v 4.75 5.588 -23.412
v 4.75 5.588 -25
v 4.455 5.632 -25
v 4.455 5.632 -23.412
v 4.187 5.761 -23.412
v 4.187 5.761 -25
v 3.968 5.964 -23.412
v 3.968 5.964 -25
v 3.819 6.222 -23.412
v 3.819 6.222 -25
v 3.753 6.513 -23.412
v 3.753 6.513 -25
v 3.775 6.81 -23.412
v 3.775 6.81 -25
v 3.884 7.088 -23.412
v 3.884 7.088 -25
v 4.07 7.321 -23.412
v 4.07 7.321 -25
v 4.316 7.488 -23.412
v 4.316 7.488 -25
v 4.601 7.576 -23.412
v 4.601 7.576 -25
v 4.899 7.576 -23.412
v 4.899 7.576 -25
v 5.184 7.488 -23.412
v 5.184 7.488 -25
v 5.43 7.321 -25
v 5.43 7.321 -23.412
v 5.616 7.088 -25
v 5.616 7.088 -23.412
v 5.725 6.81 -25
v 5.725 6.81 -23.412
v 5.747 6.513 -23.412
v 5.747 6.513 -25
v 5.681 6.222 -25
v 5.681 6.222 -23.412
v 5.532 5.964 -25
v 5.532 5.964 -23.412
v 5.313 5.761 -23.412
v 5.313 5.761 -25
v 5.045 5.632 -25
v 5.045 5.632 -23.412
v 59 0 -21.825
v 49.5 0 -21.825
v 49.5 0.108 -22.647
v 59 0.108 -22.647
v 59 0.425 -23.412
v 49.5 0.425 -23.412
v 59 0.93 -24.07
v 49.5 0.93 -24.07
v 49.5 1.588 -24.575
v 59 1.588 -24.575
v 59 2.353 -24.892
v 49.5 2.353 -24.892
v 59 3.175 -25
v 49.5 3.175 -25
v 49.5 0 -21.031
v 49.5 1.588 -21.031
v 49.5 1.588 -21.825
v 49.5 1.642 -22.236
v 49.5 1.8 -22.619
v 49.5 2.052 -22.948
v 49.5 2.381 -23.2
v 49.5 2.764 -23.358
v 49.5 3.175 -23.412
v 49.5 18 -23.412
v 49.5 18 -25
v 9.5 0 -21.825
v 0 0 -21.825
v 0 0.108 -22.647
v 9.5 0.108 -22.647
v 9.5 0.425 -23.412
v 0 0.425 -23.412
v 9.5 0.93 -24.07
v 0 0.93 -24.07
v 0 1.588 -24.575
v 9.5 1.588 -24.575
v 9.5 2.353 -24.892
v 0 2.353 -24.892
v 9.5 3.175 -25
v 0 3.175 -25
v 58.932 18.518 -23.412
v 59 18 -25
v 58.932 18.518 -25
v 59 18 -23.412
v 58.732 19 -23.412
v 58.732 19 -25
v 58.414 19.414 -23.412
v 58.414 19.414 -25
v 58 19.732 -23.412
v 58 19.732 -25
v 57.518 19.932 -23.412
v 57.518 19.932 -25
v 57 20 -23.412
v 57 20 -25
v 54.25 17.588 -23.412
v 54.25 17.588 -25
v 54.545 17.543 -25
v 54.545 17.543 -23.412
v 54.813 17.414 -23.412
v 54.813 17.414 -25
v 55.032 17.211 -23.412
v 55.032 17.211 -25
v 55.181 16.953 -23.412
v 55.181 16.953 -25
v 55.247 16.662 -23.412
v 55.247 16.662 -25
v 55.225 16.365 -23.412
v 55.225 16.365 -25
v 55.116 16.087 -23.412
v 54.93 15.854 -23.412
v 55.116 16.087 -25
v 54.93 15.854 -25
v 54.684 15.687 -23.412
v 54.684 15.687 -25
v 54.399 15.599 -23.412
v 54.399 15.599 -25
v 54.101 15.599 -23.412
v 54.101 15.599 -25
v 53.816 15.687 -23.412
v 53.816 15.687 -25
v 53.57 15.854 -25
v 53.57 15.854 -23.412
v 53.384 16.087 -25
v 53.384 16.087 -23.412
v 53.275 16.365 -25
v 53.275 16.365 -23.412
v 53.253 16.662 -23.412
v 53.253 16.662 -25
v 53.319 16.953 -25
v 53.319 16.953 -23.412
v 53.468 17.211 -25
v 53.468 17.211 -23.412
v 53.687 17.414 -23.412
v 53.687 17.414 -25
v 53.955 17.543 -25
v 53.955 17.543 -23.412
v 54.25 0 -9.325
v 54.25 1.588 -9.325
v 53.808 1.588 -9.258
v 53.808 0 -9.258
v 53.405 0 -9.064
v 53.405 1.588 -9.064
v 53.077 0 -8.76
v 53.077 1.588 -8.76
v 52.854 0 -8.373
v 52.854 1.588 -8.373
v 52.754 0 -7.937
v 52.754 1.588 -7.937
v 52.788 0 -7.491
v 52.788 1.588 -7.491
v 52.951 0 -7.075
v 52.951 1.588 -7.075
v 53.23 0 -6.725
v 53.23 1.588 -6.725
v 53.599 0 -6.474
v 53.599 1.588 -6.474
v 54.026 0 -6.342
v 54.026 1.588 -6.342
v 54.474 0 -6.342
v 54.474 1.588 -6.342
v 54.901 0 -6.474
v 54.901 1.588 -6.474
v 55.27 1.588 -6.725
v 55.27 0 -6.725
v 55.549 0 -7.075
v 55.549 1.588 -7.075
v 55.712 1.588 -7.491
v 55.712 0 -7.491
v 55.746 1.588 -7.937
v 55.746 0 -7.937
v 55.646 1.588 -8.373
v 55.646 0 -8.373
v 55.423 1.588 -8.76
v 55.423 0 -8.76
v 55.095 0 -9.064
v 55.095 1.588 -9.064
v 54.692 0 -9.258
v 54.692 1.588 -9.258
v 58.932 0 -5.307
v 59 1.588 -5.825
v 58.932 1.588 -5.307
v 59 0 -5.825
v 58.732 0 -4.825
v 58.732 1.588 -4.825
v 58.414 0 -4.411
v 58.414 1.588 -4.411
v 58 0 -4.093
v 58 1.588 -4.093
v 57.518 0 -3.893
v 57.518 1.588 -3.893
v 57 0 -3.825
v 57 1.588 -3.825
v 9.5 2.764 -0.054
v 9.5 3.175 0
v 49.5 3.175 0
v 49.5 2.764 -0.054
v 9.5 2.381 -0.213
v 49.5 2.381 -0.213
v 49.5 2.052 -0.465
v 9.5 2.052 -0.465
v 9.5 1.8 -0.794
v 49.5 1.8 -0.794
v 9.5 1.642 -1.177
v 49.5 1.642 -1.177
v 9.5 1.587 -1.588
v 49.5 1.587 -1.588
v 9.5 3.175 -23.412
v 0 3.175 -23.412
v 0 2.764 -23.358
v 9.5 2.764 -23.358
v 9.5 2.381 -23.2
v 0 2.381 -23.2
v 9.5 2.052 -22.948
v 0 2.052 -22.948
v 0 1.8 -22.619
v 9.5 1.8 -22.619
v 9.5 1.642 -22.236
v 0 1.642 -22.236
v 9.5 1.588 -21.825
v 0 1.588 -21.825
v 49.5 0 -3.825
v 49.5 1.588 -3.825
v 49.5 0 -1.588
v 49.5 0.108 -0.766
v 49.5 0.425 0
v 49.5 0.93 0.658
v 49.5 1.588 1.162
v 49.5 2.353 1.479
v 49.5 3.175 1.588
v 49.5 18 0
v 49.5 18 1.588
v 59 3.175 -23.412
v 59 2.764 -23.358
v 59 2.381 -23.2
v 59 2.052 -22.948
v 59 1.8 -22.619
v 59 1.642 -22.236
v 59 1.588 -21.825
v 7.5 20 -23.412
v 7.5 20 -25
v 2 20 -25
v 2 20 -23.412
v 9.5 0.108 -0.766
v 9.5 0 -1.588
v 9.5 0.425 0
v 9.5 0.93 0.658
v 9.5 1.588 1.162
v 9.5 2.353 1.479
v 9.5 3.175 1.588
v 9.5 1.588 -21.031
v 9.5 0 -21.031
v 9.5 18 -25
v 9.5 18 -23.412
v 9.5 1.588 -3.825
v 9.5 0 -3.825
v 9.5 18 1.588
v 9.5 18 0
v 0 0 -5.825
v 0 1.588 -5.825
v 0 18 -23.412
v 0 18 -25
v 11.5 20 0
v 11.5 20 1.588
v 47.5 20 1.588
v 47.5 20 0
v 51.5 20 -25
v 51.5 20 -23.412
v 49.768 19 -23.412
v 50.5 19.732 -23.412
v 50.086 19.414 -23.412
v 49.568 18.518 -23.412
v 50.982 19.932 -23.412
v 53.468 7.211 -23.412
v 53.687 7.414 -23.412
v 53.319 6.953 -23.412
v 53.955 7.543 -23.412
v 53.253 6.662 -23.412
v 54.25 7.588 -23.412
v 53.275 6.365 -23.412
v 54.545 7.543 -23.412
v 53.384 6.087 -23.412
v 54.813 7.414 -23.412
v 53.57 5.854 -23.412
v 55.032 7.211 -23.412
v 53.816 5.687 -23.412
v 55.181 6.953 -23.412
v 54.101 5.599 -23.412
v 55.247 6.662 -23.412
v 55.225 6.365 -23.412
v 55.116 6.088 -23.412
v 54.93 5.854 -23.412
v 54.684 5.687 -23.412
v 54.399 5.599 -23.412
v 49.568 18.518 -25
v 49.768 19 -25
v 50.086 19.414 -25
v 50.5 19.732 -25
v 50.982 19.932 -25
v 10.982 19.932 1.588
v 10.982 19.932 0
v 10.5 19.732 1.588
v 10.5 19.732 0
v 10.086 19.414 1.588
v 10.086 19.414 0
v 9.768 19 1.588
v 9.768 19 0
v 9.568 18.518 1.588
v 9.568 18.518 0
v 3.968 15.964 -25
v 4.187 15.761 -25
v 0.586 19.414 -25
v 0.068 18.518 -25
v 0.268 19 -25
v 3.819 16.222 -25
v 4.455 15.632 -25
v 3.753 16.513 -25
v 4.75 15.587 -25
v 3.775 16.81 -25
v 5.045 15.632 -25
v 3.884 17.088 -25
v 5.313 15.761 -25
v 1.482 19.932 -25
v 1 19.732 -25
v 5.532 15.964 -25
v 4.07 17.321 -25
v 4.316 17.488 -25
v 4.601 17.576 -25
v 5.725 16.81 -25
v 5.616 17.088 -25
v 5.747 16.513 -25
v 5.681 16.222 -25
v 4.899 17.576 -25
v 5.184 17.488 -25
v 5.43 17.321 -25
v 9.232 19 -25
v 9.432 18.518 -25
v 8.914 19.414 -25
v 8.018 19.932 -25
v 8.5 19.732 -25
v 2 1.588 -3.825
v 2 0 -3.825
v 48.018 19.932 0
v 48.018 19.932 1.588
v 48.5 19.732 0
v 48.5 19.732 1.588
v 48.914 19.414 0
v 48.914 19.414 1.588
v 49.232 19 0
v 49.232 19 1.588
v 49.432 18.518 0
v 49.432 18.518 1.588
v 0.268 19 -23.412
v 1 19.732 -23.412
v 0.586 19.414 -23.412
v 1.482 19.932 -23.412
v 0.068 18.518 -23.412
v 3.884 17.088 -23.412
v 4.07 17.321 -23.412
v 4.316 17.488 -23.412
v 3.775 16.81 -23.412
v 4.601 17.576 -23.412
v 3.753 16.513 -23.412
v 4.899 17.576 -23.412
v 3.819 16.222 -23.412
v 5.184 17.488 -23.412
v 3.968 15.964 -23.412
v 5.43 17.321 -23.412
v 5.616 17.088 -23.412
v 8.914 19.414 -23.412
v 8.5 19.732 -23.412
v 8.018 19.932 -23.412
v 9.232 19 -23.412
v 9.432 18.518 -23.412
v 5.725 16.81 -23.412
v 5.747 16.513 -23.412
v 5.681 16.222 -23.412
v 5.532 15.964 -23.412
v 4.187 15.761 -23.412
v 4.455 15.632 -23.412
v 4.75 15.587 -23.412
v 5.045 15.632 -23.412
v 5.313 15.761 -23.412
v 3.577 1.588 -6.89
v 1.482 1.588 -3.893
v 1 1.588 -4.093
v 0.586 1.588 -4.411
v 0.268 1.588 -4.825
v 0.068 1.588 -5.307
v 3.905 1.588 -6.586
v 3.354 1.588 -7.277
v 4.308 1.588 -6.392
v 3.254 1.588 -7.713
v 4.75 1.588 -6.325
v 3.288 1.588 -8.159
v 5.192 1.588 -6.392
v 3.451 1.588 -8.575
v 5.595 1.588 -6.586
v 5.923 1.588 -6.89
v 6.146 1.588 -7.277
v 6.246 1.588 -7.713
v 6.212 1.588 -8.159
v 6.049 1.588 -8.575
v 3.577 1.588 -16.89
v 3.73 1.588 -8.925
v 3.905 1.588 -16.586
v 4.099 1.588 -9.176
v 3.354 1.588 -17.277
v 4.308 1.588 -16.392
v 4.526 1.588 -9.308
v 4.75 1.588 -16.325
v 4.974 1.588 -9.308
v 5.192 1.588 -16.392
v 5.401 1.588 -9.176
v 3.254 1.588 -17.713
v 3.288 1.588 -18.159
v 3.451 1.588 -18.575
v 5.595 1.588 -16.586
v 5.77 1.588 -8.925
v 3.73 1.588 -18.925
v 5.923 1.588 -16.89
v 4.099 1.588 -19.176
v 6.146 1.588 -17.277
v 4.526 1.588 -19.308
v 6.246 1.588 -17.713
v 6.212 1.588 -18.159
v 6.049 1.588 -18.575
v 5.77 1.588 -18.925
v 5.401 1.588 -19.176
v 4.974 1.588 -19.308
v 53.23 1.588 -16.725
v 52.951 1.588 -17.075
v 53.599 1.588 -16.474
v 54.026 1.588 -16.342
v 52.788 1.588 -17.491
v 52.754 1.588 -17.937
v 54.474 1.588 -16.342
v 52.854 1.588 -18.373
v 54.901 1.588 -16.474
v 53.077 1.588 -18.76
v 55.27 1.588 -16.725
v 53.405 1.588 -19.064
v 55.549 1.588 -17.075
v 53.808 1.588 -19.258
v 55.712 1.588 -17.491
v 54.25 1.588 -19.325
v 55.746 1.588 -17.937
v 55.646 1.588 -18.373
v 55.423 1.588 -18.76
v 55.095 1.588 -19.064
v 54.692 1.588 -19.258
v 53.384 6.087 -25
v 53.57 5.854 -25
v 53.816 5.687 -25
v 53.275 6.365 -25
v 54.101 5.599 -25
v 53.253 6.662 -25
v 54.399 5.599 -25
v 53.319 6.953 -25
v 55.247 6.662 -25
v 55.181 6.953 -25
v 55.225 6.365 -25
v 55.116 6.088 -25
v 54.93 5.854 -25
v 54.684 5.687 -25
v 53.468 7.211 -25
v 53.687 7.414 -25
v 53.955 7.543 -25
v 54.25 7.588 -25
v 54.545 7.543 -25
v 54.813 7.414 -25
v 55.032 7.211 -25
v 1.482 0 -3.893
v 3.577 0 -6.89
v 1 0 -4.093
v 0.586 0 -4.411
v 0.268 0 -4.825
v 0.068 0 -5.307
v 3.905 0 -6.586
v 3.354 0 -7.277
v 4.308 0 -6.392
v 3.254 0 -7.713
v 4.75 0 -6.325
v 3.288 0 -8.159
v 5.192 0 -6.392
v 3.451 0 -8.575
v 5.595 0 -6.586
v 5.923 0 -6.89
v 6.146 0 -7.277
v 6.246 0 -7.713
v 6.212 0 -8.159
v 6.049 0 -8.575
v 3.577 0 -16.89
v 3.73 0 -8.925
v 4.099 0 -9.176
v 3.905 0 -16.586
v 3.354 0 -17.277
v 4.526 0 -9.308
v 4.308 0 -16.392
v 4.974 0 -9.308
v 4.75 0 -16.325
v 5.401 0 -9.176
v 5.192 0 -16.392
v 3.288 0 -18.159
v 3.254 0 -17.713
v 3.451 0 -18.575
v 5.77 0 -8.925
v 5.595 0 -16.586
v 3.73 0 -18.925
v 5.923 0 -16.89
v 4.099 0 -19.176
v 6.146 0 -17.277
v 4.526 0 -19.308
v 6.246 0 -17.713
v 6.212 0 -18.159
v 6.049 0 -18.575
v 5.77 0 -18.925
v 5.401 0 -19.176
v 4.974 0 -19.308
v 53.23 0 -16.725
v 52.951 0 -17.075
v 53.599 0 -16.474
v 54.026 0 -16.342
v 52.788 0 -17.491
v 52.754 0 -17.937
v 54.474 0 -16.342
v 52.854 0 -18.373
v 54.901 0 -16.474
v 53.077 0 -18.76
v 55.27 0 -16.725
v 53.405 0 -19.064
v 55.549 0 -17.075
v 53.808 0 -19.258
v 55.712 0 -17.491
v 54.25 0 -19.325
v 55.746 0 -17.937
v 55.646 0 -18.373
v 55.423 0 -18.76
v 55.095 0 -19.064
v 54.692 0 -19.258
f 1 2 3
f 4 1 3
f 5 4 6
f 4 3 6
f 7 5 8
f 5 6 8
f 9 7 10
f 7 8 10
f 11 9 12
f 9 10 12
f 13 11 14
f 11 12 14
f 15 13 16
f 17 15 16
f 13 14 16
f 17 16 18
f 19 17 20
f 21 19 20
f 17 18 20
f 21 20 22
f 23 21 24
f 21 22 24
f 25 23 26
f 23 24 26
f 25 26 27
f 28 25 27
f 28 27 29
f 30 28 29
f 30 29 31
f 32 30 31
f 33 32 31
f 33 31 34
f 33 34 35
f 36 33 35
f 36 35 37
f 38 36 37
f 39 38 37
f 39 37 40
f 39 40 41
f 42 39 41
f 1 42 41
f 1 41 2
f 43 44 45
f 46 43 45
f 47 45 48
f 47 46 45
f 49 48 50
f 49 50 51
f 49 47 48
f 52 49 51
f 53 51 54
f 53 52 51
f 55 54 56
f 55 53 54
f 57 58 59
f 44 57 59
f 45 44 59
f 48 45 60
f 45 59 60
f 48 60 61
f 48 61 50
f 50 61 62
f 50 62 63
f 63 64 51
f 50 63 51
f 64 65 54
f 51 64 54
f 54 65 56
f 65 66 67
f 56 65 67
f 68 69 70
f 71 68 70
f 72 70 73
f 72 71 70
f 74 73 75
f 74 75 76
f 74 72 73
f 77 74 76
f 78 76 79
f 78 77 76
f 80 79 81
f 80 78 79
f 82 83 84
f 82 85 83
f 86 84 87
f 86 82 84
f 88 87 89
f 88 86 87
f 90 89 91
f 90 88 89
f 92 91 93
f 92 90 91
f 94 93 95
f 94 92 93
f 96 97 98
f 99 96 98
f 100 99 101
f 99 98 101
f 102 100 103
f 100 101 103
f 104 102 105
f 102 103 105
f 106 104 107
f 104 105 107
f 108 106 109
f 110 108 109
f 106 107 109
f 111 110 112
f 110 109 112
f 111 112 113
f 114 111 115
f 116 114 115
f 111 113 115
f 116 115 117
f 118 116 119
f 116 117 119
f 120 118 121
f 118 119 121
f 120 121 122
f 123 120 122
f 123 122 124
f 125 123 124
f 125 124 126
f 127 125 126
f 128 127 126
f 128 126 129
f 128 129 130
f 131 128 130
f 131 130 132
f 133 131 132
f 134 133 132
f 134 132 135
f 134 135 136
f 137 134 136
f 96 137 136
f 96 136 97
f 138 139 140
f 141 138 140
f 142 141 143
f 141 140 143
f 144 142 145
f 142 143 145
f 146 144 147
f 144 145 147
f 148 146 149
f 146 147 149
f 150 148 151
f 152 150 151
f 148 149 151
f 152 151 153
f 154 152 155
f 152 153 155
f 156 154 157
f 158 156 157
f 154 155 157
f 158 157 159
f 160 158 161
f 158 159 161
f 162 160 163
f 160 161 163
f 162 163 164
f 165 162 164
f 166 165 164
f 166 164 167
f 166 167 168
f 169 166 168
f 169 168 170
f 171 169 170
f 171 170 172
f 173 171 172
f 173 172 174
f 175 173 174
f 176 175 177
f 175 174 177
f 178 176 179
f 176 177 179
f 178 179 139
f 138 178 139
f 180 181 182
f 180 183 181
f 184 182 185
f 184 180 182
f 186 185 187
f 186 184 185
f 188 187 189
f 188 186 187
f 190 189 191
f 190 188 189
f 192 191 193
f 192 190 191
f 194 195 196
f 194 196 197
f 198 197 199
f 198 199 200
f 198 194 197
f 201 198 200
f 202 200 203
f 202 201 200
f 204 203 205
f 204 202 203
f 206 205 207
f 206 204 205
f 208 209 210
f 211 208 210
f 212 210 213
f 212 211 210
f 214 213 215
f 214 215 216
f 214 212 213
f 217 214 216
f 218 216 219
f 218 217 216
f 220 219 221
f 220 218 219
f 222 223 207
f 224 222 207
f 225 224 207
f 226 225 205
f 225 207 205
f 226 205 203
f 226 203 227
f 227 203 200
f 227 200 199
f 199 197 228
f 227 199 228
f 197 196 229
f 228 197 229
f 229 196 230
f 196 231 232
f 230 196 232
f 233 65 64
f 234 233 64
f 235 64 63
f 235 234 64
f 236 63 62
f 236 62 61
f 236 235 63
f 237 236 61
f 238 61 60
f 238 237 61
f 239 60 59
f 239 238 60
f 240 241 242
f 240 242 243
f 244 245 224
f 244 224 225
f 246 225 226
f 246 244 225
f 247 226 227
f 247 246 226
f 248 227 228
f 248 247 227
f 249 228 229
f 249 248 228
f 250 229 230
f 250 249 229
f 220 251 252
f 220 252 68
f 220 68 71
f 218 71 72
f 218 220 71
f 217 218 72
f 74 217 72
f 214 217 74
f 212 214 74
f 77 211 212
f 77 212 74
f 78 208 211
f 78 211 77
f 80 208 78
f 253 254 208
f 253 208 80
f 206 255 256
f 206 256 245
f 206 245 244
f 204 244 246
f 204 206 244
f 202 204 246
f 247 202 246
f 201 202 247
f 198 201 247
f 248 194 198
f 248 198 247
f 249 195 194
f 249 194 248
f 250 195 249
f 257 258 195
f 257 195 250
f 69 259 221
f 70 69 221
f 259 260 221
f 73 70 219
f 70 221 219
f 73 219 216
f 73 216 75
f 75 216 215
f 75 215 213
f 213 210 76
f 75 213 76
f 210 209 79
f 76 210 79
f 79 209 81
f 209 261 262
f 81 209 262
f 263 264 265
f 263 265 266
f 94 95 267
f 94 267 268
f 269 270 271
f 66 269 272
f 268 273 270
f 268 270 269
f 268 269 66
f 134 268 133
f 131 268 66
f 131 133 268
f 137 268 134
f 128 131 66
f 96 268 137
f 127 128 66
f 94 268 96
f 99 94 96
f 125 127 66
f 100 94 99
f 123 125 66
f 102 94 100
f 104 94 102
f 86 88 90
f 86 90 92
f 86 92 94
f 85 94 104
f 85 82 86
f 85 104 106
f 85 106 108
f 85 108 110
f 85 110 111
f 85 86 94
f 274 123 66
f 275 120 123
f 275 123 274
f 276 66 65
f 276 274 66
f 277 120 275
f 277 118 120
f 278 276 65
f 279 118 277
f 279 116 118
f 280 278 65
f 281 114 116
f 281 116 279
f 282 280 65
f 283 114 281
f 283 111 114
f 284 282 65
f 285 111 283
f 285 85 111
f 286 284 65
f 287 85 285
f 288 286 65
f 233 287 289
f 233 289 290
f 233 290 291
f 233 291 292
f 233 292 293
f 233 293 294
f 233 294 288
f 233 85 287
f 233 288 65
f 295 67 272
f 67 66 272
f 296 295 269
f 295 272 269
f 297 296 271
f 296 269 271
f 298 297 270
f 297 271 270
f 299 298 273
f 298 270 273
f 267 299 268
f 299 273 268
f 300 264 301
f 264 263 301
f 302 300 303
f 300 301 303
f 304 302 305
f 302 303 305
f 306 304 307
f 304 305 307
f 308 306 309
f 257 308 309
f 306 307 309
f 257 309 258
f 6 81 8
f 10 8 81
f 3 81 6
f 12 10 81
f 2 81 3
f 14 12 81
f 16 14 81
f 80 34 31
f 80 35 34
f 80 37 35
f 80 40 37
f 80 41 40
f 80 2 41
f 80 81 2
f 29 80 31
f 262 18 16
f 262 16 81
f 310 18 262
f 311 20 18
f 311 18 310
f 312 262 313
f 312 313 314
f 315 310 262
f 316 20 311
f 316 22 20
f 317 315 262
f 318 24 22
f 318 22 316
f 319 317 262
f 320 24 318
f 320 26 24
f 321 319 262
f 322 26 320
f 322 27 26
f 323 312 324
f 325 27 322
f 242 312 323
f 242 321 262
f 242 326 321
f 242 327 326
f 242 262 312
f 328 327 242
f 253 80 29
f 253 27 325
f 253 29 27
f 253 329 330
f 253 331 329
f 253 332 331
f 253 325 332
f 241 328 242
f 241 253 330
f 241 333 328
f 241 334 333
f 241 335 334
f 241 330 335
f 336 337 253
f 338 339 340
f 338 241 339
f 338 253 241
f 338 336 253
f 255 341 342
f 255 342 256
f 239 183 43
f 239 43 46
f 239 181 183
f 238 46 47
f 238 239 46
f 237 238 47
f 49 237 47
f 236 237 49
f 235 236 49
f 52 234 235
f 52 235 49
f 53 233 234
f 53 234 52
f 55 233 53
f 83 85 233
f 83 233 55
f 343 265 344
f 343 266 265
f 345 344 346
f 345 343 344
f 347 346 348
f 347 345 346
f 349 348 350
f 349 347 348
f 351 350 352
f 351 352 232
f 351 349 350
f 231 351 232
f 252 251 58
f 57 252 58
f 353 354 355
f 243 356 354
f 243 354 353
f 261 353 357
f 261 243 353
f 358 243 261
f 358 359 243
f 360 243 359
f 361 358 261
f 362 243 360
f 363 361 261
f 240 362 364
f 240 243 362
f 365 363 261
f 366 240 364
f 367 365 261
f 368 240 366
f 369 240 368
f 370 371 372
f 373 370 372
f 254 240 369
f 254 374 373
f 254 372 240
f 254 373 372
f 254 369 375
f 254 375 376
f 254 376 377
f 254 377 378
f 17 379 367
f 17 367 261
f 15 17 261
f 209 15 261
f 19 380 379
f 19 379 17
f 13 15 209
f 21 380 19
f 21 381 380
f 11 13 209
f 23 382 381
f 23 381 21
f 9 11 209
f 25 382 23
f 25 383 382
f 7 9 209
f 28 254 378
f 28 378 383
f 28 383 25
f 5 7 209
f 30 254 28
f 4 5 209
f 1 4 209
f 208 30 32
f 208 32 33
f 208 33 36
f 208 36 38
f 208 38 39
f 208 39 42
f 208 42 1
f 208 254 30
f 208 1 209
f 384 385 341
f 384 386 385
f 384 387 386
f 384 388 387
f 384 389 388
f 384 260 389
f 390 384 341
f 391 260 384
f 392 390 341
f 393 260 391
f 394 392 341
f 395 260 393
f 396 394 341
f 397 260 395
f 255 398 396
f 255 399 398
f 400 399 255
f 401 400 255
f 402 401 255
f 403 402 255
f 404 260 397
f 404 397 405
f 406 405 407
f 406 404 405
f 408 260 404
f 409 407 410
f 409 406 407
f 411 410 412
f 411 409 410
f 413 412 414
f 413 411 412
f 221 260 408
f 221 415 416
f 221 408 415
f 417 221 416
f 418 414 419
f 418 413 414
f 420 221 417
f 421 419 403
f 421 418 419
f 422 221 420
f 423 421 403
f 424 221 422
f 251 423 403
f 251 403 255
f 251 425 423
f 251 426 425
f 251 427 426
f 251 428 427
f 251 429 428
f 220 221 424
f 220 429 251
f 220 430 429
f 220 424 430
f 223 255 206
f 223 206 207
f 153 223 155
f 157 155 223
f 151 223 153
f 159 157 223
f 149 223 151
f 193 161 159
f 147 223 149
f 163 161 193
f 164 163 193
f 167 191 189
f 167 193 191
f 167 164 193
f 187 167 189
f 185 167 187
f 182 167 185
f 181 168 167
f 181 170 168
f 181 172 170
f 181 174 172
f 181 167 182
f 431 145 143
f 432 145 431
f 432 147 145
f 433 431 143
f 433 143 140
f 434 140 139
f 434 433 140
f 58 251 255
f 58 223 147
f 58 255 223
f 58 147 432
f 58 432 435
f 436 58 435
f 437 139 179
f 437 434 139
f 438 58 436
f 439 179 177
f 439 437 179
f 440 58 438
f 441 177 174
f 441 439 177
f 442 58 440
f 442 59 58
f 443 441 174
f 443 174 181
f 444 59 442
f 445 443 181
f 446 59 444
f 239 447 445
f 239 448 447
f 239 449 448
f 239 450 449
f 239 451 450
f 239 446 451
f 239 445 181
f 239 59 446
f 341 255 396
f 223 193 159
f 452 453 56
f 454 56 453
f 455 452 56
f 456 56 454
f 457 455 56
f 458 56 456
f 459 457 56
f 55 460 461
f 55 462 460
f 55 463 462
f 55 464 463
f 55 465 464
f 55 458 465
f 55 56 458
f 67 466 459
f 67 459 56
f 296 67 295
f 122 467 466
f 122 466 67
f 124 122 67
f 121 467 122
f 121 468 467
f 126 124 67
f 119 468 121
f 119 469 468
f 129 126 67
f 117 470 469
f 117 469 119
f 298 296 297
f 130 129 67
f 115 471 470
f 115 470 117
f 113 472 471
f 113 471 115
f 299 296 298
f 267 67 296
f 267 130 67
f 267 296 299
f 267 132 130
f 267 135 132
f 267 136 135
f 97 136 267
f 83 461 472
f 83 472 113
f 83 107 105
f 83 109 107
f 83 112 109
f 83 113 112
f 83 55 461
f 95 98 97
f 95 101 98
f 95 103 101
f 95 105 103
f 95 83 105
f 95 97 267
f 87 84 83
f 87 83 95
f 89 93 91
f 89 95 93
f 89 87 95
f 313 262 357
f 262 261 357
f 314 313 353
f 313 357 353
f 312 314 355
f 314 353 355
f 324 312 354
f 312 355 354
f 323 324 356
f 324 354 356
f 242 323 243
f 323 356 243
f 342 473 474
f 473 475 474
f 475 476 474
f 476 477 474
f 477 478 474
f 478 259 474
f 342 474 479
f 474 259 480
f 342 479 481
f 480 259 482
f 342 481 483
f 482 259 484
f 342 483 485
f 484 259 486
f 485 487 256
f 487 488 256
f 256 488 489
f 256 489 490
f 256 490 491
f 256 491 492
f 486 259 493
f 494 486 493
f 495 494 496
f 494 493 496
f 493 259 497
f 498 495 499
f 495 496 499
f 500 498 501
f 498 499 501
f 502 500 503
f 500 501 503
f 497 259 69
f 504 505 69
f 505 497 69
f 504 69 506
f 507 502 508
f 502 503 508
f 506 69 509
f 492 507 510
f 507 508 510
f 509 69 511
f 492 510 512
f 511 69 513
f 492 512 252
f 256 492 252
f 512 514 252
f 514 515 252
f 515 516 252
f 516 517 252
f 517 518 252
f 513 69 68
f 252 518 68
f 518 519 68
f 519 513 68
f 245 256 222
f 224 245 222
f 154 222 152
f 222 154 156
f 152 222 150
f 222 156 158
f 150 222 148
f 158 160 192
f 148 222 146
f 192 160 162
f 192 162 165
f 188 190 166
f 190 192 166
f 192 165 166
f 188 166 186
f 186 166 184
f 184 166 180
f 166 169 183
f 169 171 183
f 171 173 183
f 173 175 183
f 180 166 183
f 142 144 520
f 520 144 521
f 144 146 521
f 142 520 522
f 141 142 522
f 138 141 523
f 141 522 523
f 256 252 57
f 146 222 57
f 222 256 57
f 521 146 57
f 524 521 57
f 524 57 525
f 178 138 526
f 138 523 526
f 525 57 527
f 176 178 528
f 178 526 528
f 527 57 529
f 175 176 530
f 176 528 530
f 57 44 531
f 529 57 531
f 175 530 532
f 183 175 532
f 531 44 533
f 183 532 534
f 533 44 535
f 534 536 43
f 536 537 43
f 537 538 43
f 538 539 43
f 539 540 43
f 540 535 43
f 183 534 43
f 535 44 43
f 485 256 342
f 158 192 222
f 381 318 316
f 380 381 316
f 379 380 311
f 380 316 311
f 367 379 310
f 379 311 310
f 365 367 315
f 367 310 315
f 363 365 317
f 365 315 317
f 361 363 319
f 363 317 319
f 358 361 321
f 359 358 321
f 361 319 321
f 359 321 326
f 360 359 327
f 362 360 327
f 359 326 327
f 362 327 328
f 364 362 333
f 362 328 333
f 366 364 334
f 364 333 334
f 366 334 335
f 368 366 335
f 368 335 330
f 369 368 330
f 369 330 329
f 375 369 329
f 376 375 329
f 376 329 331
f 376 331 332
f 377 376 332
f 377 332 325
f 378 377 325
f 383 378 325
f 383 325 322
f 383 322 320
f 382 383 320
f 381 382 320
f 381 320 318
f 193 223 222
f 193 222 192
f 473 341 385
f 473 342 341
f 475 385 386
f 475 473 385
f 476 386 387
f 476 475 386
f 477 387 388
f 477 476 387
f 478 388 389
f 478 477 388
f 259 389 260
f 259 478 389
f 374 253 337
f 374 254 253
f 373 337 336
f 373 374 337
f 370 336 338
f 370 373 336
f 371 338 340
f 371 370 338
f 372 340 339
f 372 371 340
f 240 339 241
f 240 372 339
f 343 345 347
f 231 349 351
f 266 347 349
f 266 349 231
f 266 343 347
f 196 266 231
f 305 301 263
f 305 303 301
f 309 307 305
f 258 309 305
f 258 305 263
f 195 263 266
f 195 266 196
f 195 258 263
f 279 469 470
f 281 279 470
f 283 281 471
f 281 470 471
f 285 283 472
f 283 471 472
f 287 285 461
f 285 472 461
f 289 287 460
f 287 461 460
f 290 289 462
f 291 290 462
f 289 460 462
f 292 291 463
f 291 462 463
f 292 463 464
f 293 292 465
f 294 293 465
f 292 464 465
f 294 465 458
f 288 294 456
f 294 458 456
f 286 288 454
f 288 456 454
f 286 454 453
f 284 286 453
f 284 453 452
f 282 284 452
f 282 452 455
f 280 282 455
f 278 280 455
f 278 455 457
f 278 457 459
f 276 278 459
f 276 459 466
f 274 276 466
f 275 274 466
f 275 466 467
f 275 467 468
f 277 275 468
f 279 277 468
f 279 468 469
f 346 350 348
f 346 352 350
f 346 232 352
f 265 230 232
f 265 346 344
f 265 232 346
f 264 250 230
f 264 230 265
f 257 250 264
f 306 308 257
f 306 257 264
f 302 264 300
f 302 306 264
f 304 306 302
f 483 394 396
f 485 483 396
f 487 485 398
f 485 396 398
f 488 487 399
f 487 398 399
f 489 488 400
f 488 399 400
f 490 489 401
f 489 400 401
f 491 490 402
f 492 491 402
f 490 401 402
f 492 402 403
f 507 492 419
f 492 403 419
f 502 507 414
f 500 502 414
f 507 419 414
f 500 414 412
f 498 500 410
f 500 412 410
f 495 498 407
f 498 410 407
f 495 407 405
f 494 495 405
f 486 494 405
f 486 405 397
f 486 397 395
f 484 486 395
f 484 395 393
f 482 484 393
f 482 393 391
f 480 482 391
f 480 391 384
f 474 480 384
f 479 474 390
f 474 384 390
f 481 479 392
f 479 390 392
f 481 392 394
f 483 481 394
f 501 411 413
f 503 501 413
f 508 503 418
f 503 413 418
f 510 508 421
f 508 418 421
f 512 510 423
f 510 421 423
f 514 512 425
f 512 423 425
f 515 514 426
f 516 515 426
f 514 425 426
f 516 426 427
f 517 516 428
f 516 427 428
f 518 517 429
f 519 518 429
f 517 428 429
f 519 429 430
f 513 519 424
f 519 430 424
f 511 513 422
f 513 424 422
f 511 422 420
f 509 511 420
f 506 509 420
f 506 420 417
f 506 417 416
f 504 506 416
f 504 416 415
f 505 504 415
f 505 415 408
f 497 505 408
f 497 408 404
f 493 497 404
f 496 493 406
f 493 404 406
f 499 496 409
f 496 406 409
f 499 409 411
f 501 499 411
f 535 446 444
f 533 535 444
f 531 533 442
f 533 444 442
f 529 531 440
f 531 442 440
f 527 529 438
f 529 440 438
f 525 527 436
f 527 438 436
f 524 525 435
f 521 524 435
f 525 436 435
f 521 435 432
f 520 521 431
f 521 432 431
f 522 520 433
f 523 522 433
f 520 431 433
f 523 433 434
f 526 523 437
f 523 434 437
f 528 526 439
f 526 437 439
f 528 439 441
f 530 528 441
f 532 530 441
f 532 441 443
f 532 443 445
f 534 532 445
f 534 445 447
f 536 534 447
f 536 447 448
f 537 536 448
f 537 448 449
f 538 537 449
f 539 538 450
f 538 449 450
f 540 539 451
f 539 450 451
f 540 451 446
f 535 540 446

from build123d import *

# Parameters (mm, degrees)
SKETCH2_W                     = 59
SKETCH2_H                     = 25
BOSS_EXTRUDE1_DEPTH           = 1.5875
EDGE_FLANGE2_STRIP_W          = 9.525
EDGE_FLANGE2_STRIP_H          = 1.5875
EDGE_FLANGE2_STRIP_CUT_DEPTH  = 9.5
EDGE_FLANGE2_RELIEF_W         = 10.31875
EDGE_FLANGE2_RELIEF_H         = 0.79375
EDGE_FLANGE2_RELIEF_CUT_DEPTH = 1.5875
EDGE_FLANGE2_DEPTH            = 9.5
EDGE_FLANGE3_STRIP_W          = 9.525
EDGE_FLANGE3_STRIP_H          = 1.5875
EDGE_FLANGE3_STRIP_CUT_DEPTH  = 9.5
EDGE_FLANGE3_RELIEF_W         = 10.31875
EDGE_FLANGE3_RELIEF_H         = 0.79375
EDGE_FLANGE3_RELIEF_CUT_DEPTH = 1.5875
EDGE_FLANGE3_DEPTH            = 9.5
CUT_EXTRUDE1_REACH            = 69.127
SKETCH16_R                    = 1
SKETCH18_W                    = 38.4125
SKETCH18_H                    = 12
BOSS_EXTRUDE2_DEPTH           = 1.5875
SKETCH19_R                    = 1.5
SKETCH19_W                    = 9.5
SKETCH19_H                    = 3.825
CUT_EXTRUDE2_DEPTH            = 1.5875
EDGE_FLANGE4_STRIP_W          = 9.525
EDGE_FLANGE4_STRIP_H          = 1.5875
EDGE_FLANGE4_STRIP_CUT_DEPTH  = 40
EDGE_FLANGE4_DEPTH            = 40
FILLET1_R                     = 2
SKETCH24_W                    = 38.4125
SKETCH24_H                    = 15.96875
CUT_EXTRUDE3_DEPTH            = 10


# Sheet-metal steps are written as plain solids
with BuildPart() as part:
    # Sketch2 → Boss-Extrude1 (new body)
    with BuildSketch(Plane(origin=(0, 0, 0), x_dir=(1, 0, 0), z_dir=(0, 1, 0))):
        with Locations((29.5, 12.5)):
            Rectangle(SKETCH2_W, SKETCH2_H)
    extrude(amount=BOSS_EXTRUDE1_DEPTH)

    # Edge-Flange2 strip (across the edge) → Edge-Flange2 strip cut (cut)
    with BuildSketch(Plane(origin=(59, 1.5875, -25), x_dir=(0, 0, 1), z_dir=(-1, 0, 0))):
        with Locations((-1.5875, -0.79375)):
            Rectangle(EDGE_FLANGE2_STRIP_W, EDGE_FLANGE2_STRIP_H)
    extrude(amount=EDGE_FLANGE2_STRIP_CUT_DEPTH, mode=Mode.SUBTRACT)

    # Edge-Flange2 relief (on the sheet) → Edge-Flange2 relief cut (cut)
    with BuildSketch(Plane(origin=(59, 1.5875, -21.825), x_dir=(0, 0, 1), z_dir=(0, 1, 0))):
        with Locations((-4.365625, -9.896875)):
            Rectangle(EDGE_FLANGE2_RELIEF_W, EDGE_FLANGE2_RELIEF_H)
    extrude(amount=-EDGE_FLANGE2_RELIEF_CUT_DEPTH, mode=Mode.SUBTRACT)

    # Edge-Flange2 section (across the edge) → Edge-Flange2 (add)
    with BuildSketch(Plane(origin=(59, 1.5875, -25), x_dir=(0, 0, 1), z_dir=(-1, 0, 0))):
        with BuildLine():
            Line((0, 1.5875), (0, 18.4125))
            Line((0, 18.4125), (1.5875, 18.4125))
            Line((1.5875, 18.4125), (1.5875, 1.5875))
            ThreePointArc((1.5875, 1.5875), (2.052467985, 0.464967985), (3.175, 0))
            Line((3.175, 0), (3.175, -1.5875))
            ThreePointArc((3.175, -1.5875), (0.92993597, -0.65756403), (0, 1.5875))
        make_face()
    extrude(amount=EDGE_FLANGE2_DEPTH)

    # Edge-Flange3 strip (across the edge) → Edge-Flange3 strip cut (cut)
    with BuildSketch(Plane(origin=(9.5, 1.5875, -25), x_dir=(0, 0, 1), z_dir=(-1, 0, 0))):
        with Locations((-1.5875, -0.79375)):
            Rectangle(EDGE_FLANGE3_STRIP_W, EDGE_FLANGE3_STRIP_H)
    extrude(amount=EDGE_FLANGE3_STRIP_CUT_DEPTH, mode=Mode.SUBTRACT)

    # Edge-Flange3 relief (on the sheet) → Edge-Flange3 relief cut (cut)
    with BuildSketch(Plane(origin=(9.5, 1.5875, -21.825), x_dir=(0, 0, 1), z_dir=(0, 1, 0))):
        with Locations((-4.365625, 0.396875)):
            Rectangle(EDGE_FLANGE3_RELIEF_W, EDGE_FLANGE3_RELIEF_H)
    extrude(amount=-EDGE_FLANGE3_RELIEF_CUT_DEPTH, mode=Mode.SUBTRACT)

    # Edge-Flange3 section (across the edge) → Edge-Flange3 (add)
    with BuildSketch(Plane(origin=(9.5, 1.5875, -25), x_dir=(0, 0, 1), z_dir=(-1, 0, 0))):
        with BuildLine():
            Line((0, 1.5875), (0, 18.4125))
            Line((0, 18.4125), (1.5875, 18.4125))
            Line((1.5875, 18.4125), (1.5875, 1.5875))
            ThreePointArc((1.5875, 1.5875), (2.052467985, 0.464967985), (3.175, 0))
            Line((3.175, 0), (3.175, -1.5875))
            ThreePointArc((3.175, -1.5875), (0.92993597, -0.65756403), (0, 1.5875))
        make_face()
    extrude(amount=EDGE_FLANGE3_DEPTH)

    # Sketch16 → Cut-Extrude1 (cut, up to next)
    with BuildSketch(Plane(origin=(0, 0, -25), x_dir=(-1, 0, 0), z_dir=(0, 0, -1)), mode=Mode.PRIVATE) as cut_extrude1_sk1:
        with Locations(Location((-54.25, 16.5875, 0), (0, 0, 90))):
            Circle(SKETCH16_R)
    cut_extrude1_tool1 = extrude(cut_extrude1_sk1.sketch, amount=-CUT_EXTRUDE1_REACH, mode=Mode.PRIVATE) & part.part
    # Sketch16 → Cut-Extrude1 (cut, up to next)
    with BuildSketch(Plane(origin=(0, 0, -25), x_dir=(-1, 0, 0), z_dir=(0, 0, -1)), mode=Mode.PRIVATE) as cut_extrude1_sk2:
        with Locations(Location((-54.25, 6.5875, 0), (0, 0, 90))):
            Circle(SKETCH16_R)
    cut_extrude1_tool2 = extrude(cut_extrude1_sk2.sketch, amount=-CUT_EXTRUDE1_REACH, mode=Mode.PRIVATE) & part.part
    # Sketch16 → Cut-Extrude1 (cut, up to next)
    with BuildSketch(Plane(origin=(0, 0, -25), x_dir=(-1, 0, 0), z_dir=(0, 0, -1)), mode=Mode.PRIVATE) as cut_extrude1_sk3:
        with Locations(Location((-4.75, 6.5875, 0), (0, 0, 270))):
            Circle(SKETCH16_R)
    cut_extrude1_tool3 = extrude(cut_extrude1_sk3.sketch, amount=-CUT_EXTRUDE1_REACH, mode=Mode.PRIVATE) & part.part
    # Sketch16 → Cut-Extrude1 (cut, up to next)
    with BuildSketch(Plane(origin=(0, 0, -25), x_dir=(-1, 0, 0), z_dir=(0, 0, -1)), mode=Mode.PRIVATE) as cut_extrude1_sk4:
        with Locations(Location((-4.75, 16.5875, 0), (0, 0, 270))):
            Circle(SKETCH16_R)
    cut_extrude1_tool4 = extrude(cut_extrude1_sk4.sketch, amount=-CUT_EXTRUDE1_REACH, mode=Mode.PRIVATE) & part.part
    add(cut_extrude1_tool1.solids().sort_by_distance((54.25, 16.5875, -25))[0], mode=Mode.SUBTRACT)
    add(cut_extrude1_tool2.solids().sort_by_distance((54.25, 6.5875, -25))[0], mode=Mode.SUBTRACT)
    add(cut_extrude1_tool3.solids().sort_by_distance((4.75, 6.5875, -25))[0], mode=Mode.SUBTRACT)
    add(cut_extrude1_tool4.solids().sort_by_distance((4.75, 16.5875, -25))[0], mode=Mode.SUBTRACT)

    # Sketch18 → Boss-Extrude2 (add)
    with BuildSketch(Plane(origin=(0, 1.5875, 0), x_dir=(1, 0, 0), z_dir=(0, 1, 0))):
        with Locations((29.5, 31)):
            Rectangle(SKETCH18_W, SKETCH18_H)
    extrude(amount=-BOSS_EXTRUDE2_DEPTH)

    # Sketch19 → Cut-Extrude2 (cut)
    with BuildSketch(Plane(origin=(0, 1.5875, 0), x_dir=(1, 0, 0), z_dir=(0, 1, 0))):
        with Locations(Location((4.75, 17.825, 0), (0, 0, 270))):
            Circle(SKETCH19_R)
        with Locations(Location((4.75, 7.825, 0), (0, 0, 270))):
            Circle(SKETCH19_R)
        with Locations(Location((54.25, 17.825, 0), (0, 0, 90))):
            Circle(SKETCH19_R)
        with Locations(Location((54.25, 7.825, 0), (0, 0, 90))):
            Circle(SKETCH19_R)
        with Locations((54.25, 1.9125)):
            Rectangle(SKETCH19_W, SKETCH19_H)
        with Locations((4.75, 1.9125)):
            Rectangle(SKETCH19_W, SKETCH19_H)
    extrude(amount=-CUT_EXTRUDE2_DEPTH, mode=Mode.SUBTRACT)

    # Edge-Flange4 strip (across the edge) → Edge-Flange4 strip cut (cut)
    with BuildSketch(Plane(origin=(9.5, 1.5875, 0), x_dir=(0, 0, -1), z_dir=(1, 0, 0))):
        with Locations((-3.175, -0.79375)):
            Rectangle(EDGE_FLANGE4_STRIP_W, EDGE_FLANGE4_STRIP_H)
    extrude(amount=EDGE_FLANGE4_STRIP_CUT_DEPTH, mode=Mode.SUBTRACT)

    # Edge-Flange4 section (across the edge) → Edge-Flange4 (add)
    with BuildSketch(Plane(origin=(9.5, 1.5875, 0), x_dir=(0, 0, -1), z_dir=(1, 0, 0))):
        with BuildLine():
            Line((-1.5875, 1.5875), (-1.5875, 18.4125))
            Line((-1.5875, 18.4125), (0, 18.4125))
            Line((0, 18.4125), (0, 1.5875))
            ThreePointArc((0, 1.5875), (0.464967985, 0.464967985), (1.5875, 0))
            Line((1.5875, 0), (1.5875, -1.5875))
            ThreePointArc((1.5875, -1.5875), (-0.65756403, -0.65756403), (-1.5875, 1.5875))
        make_face()
    extrude(amount=EDGE_FLANGE4_DEPTH)

    # Fillet1
    fillet1_edges = [part.edges().sort_by_distance(p)[0] for p in [
        (10.29375, 0.79375, -37),
        (48.70625, 0.79375, -37),
        (0, 0.79375, -3.825),
        (59, 0.79375, -3.825),
        (9.5, 20, 0.79375),
        (49.5, 20, 0.79375),
        (59, 20, -24.20625),
        (49.5, 20, -24.20625),
        (9.5, 20, -24.20625),
        (0, 20, -24.20625),
    ]]
    fillet(fillet1_edges, radius=FILLET1_R)

    # Sketch24 → Cut-Extrude3 (cut)
    with BuildSketch(Plane(origin=(0, 1.5875, 0), x_dir=(1, 0, 0), z_dir=(0, 1, 0))):
        with Locations((29.5, 29.015625)):
            Rectangle(SKETCH24_W, SKETCH24_H)
    extrude(amount=-CUT_EXTRUDE3_DEPTH, mode=Mode.SUBTRACT)


solid = part.part
